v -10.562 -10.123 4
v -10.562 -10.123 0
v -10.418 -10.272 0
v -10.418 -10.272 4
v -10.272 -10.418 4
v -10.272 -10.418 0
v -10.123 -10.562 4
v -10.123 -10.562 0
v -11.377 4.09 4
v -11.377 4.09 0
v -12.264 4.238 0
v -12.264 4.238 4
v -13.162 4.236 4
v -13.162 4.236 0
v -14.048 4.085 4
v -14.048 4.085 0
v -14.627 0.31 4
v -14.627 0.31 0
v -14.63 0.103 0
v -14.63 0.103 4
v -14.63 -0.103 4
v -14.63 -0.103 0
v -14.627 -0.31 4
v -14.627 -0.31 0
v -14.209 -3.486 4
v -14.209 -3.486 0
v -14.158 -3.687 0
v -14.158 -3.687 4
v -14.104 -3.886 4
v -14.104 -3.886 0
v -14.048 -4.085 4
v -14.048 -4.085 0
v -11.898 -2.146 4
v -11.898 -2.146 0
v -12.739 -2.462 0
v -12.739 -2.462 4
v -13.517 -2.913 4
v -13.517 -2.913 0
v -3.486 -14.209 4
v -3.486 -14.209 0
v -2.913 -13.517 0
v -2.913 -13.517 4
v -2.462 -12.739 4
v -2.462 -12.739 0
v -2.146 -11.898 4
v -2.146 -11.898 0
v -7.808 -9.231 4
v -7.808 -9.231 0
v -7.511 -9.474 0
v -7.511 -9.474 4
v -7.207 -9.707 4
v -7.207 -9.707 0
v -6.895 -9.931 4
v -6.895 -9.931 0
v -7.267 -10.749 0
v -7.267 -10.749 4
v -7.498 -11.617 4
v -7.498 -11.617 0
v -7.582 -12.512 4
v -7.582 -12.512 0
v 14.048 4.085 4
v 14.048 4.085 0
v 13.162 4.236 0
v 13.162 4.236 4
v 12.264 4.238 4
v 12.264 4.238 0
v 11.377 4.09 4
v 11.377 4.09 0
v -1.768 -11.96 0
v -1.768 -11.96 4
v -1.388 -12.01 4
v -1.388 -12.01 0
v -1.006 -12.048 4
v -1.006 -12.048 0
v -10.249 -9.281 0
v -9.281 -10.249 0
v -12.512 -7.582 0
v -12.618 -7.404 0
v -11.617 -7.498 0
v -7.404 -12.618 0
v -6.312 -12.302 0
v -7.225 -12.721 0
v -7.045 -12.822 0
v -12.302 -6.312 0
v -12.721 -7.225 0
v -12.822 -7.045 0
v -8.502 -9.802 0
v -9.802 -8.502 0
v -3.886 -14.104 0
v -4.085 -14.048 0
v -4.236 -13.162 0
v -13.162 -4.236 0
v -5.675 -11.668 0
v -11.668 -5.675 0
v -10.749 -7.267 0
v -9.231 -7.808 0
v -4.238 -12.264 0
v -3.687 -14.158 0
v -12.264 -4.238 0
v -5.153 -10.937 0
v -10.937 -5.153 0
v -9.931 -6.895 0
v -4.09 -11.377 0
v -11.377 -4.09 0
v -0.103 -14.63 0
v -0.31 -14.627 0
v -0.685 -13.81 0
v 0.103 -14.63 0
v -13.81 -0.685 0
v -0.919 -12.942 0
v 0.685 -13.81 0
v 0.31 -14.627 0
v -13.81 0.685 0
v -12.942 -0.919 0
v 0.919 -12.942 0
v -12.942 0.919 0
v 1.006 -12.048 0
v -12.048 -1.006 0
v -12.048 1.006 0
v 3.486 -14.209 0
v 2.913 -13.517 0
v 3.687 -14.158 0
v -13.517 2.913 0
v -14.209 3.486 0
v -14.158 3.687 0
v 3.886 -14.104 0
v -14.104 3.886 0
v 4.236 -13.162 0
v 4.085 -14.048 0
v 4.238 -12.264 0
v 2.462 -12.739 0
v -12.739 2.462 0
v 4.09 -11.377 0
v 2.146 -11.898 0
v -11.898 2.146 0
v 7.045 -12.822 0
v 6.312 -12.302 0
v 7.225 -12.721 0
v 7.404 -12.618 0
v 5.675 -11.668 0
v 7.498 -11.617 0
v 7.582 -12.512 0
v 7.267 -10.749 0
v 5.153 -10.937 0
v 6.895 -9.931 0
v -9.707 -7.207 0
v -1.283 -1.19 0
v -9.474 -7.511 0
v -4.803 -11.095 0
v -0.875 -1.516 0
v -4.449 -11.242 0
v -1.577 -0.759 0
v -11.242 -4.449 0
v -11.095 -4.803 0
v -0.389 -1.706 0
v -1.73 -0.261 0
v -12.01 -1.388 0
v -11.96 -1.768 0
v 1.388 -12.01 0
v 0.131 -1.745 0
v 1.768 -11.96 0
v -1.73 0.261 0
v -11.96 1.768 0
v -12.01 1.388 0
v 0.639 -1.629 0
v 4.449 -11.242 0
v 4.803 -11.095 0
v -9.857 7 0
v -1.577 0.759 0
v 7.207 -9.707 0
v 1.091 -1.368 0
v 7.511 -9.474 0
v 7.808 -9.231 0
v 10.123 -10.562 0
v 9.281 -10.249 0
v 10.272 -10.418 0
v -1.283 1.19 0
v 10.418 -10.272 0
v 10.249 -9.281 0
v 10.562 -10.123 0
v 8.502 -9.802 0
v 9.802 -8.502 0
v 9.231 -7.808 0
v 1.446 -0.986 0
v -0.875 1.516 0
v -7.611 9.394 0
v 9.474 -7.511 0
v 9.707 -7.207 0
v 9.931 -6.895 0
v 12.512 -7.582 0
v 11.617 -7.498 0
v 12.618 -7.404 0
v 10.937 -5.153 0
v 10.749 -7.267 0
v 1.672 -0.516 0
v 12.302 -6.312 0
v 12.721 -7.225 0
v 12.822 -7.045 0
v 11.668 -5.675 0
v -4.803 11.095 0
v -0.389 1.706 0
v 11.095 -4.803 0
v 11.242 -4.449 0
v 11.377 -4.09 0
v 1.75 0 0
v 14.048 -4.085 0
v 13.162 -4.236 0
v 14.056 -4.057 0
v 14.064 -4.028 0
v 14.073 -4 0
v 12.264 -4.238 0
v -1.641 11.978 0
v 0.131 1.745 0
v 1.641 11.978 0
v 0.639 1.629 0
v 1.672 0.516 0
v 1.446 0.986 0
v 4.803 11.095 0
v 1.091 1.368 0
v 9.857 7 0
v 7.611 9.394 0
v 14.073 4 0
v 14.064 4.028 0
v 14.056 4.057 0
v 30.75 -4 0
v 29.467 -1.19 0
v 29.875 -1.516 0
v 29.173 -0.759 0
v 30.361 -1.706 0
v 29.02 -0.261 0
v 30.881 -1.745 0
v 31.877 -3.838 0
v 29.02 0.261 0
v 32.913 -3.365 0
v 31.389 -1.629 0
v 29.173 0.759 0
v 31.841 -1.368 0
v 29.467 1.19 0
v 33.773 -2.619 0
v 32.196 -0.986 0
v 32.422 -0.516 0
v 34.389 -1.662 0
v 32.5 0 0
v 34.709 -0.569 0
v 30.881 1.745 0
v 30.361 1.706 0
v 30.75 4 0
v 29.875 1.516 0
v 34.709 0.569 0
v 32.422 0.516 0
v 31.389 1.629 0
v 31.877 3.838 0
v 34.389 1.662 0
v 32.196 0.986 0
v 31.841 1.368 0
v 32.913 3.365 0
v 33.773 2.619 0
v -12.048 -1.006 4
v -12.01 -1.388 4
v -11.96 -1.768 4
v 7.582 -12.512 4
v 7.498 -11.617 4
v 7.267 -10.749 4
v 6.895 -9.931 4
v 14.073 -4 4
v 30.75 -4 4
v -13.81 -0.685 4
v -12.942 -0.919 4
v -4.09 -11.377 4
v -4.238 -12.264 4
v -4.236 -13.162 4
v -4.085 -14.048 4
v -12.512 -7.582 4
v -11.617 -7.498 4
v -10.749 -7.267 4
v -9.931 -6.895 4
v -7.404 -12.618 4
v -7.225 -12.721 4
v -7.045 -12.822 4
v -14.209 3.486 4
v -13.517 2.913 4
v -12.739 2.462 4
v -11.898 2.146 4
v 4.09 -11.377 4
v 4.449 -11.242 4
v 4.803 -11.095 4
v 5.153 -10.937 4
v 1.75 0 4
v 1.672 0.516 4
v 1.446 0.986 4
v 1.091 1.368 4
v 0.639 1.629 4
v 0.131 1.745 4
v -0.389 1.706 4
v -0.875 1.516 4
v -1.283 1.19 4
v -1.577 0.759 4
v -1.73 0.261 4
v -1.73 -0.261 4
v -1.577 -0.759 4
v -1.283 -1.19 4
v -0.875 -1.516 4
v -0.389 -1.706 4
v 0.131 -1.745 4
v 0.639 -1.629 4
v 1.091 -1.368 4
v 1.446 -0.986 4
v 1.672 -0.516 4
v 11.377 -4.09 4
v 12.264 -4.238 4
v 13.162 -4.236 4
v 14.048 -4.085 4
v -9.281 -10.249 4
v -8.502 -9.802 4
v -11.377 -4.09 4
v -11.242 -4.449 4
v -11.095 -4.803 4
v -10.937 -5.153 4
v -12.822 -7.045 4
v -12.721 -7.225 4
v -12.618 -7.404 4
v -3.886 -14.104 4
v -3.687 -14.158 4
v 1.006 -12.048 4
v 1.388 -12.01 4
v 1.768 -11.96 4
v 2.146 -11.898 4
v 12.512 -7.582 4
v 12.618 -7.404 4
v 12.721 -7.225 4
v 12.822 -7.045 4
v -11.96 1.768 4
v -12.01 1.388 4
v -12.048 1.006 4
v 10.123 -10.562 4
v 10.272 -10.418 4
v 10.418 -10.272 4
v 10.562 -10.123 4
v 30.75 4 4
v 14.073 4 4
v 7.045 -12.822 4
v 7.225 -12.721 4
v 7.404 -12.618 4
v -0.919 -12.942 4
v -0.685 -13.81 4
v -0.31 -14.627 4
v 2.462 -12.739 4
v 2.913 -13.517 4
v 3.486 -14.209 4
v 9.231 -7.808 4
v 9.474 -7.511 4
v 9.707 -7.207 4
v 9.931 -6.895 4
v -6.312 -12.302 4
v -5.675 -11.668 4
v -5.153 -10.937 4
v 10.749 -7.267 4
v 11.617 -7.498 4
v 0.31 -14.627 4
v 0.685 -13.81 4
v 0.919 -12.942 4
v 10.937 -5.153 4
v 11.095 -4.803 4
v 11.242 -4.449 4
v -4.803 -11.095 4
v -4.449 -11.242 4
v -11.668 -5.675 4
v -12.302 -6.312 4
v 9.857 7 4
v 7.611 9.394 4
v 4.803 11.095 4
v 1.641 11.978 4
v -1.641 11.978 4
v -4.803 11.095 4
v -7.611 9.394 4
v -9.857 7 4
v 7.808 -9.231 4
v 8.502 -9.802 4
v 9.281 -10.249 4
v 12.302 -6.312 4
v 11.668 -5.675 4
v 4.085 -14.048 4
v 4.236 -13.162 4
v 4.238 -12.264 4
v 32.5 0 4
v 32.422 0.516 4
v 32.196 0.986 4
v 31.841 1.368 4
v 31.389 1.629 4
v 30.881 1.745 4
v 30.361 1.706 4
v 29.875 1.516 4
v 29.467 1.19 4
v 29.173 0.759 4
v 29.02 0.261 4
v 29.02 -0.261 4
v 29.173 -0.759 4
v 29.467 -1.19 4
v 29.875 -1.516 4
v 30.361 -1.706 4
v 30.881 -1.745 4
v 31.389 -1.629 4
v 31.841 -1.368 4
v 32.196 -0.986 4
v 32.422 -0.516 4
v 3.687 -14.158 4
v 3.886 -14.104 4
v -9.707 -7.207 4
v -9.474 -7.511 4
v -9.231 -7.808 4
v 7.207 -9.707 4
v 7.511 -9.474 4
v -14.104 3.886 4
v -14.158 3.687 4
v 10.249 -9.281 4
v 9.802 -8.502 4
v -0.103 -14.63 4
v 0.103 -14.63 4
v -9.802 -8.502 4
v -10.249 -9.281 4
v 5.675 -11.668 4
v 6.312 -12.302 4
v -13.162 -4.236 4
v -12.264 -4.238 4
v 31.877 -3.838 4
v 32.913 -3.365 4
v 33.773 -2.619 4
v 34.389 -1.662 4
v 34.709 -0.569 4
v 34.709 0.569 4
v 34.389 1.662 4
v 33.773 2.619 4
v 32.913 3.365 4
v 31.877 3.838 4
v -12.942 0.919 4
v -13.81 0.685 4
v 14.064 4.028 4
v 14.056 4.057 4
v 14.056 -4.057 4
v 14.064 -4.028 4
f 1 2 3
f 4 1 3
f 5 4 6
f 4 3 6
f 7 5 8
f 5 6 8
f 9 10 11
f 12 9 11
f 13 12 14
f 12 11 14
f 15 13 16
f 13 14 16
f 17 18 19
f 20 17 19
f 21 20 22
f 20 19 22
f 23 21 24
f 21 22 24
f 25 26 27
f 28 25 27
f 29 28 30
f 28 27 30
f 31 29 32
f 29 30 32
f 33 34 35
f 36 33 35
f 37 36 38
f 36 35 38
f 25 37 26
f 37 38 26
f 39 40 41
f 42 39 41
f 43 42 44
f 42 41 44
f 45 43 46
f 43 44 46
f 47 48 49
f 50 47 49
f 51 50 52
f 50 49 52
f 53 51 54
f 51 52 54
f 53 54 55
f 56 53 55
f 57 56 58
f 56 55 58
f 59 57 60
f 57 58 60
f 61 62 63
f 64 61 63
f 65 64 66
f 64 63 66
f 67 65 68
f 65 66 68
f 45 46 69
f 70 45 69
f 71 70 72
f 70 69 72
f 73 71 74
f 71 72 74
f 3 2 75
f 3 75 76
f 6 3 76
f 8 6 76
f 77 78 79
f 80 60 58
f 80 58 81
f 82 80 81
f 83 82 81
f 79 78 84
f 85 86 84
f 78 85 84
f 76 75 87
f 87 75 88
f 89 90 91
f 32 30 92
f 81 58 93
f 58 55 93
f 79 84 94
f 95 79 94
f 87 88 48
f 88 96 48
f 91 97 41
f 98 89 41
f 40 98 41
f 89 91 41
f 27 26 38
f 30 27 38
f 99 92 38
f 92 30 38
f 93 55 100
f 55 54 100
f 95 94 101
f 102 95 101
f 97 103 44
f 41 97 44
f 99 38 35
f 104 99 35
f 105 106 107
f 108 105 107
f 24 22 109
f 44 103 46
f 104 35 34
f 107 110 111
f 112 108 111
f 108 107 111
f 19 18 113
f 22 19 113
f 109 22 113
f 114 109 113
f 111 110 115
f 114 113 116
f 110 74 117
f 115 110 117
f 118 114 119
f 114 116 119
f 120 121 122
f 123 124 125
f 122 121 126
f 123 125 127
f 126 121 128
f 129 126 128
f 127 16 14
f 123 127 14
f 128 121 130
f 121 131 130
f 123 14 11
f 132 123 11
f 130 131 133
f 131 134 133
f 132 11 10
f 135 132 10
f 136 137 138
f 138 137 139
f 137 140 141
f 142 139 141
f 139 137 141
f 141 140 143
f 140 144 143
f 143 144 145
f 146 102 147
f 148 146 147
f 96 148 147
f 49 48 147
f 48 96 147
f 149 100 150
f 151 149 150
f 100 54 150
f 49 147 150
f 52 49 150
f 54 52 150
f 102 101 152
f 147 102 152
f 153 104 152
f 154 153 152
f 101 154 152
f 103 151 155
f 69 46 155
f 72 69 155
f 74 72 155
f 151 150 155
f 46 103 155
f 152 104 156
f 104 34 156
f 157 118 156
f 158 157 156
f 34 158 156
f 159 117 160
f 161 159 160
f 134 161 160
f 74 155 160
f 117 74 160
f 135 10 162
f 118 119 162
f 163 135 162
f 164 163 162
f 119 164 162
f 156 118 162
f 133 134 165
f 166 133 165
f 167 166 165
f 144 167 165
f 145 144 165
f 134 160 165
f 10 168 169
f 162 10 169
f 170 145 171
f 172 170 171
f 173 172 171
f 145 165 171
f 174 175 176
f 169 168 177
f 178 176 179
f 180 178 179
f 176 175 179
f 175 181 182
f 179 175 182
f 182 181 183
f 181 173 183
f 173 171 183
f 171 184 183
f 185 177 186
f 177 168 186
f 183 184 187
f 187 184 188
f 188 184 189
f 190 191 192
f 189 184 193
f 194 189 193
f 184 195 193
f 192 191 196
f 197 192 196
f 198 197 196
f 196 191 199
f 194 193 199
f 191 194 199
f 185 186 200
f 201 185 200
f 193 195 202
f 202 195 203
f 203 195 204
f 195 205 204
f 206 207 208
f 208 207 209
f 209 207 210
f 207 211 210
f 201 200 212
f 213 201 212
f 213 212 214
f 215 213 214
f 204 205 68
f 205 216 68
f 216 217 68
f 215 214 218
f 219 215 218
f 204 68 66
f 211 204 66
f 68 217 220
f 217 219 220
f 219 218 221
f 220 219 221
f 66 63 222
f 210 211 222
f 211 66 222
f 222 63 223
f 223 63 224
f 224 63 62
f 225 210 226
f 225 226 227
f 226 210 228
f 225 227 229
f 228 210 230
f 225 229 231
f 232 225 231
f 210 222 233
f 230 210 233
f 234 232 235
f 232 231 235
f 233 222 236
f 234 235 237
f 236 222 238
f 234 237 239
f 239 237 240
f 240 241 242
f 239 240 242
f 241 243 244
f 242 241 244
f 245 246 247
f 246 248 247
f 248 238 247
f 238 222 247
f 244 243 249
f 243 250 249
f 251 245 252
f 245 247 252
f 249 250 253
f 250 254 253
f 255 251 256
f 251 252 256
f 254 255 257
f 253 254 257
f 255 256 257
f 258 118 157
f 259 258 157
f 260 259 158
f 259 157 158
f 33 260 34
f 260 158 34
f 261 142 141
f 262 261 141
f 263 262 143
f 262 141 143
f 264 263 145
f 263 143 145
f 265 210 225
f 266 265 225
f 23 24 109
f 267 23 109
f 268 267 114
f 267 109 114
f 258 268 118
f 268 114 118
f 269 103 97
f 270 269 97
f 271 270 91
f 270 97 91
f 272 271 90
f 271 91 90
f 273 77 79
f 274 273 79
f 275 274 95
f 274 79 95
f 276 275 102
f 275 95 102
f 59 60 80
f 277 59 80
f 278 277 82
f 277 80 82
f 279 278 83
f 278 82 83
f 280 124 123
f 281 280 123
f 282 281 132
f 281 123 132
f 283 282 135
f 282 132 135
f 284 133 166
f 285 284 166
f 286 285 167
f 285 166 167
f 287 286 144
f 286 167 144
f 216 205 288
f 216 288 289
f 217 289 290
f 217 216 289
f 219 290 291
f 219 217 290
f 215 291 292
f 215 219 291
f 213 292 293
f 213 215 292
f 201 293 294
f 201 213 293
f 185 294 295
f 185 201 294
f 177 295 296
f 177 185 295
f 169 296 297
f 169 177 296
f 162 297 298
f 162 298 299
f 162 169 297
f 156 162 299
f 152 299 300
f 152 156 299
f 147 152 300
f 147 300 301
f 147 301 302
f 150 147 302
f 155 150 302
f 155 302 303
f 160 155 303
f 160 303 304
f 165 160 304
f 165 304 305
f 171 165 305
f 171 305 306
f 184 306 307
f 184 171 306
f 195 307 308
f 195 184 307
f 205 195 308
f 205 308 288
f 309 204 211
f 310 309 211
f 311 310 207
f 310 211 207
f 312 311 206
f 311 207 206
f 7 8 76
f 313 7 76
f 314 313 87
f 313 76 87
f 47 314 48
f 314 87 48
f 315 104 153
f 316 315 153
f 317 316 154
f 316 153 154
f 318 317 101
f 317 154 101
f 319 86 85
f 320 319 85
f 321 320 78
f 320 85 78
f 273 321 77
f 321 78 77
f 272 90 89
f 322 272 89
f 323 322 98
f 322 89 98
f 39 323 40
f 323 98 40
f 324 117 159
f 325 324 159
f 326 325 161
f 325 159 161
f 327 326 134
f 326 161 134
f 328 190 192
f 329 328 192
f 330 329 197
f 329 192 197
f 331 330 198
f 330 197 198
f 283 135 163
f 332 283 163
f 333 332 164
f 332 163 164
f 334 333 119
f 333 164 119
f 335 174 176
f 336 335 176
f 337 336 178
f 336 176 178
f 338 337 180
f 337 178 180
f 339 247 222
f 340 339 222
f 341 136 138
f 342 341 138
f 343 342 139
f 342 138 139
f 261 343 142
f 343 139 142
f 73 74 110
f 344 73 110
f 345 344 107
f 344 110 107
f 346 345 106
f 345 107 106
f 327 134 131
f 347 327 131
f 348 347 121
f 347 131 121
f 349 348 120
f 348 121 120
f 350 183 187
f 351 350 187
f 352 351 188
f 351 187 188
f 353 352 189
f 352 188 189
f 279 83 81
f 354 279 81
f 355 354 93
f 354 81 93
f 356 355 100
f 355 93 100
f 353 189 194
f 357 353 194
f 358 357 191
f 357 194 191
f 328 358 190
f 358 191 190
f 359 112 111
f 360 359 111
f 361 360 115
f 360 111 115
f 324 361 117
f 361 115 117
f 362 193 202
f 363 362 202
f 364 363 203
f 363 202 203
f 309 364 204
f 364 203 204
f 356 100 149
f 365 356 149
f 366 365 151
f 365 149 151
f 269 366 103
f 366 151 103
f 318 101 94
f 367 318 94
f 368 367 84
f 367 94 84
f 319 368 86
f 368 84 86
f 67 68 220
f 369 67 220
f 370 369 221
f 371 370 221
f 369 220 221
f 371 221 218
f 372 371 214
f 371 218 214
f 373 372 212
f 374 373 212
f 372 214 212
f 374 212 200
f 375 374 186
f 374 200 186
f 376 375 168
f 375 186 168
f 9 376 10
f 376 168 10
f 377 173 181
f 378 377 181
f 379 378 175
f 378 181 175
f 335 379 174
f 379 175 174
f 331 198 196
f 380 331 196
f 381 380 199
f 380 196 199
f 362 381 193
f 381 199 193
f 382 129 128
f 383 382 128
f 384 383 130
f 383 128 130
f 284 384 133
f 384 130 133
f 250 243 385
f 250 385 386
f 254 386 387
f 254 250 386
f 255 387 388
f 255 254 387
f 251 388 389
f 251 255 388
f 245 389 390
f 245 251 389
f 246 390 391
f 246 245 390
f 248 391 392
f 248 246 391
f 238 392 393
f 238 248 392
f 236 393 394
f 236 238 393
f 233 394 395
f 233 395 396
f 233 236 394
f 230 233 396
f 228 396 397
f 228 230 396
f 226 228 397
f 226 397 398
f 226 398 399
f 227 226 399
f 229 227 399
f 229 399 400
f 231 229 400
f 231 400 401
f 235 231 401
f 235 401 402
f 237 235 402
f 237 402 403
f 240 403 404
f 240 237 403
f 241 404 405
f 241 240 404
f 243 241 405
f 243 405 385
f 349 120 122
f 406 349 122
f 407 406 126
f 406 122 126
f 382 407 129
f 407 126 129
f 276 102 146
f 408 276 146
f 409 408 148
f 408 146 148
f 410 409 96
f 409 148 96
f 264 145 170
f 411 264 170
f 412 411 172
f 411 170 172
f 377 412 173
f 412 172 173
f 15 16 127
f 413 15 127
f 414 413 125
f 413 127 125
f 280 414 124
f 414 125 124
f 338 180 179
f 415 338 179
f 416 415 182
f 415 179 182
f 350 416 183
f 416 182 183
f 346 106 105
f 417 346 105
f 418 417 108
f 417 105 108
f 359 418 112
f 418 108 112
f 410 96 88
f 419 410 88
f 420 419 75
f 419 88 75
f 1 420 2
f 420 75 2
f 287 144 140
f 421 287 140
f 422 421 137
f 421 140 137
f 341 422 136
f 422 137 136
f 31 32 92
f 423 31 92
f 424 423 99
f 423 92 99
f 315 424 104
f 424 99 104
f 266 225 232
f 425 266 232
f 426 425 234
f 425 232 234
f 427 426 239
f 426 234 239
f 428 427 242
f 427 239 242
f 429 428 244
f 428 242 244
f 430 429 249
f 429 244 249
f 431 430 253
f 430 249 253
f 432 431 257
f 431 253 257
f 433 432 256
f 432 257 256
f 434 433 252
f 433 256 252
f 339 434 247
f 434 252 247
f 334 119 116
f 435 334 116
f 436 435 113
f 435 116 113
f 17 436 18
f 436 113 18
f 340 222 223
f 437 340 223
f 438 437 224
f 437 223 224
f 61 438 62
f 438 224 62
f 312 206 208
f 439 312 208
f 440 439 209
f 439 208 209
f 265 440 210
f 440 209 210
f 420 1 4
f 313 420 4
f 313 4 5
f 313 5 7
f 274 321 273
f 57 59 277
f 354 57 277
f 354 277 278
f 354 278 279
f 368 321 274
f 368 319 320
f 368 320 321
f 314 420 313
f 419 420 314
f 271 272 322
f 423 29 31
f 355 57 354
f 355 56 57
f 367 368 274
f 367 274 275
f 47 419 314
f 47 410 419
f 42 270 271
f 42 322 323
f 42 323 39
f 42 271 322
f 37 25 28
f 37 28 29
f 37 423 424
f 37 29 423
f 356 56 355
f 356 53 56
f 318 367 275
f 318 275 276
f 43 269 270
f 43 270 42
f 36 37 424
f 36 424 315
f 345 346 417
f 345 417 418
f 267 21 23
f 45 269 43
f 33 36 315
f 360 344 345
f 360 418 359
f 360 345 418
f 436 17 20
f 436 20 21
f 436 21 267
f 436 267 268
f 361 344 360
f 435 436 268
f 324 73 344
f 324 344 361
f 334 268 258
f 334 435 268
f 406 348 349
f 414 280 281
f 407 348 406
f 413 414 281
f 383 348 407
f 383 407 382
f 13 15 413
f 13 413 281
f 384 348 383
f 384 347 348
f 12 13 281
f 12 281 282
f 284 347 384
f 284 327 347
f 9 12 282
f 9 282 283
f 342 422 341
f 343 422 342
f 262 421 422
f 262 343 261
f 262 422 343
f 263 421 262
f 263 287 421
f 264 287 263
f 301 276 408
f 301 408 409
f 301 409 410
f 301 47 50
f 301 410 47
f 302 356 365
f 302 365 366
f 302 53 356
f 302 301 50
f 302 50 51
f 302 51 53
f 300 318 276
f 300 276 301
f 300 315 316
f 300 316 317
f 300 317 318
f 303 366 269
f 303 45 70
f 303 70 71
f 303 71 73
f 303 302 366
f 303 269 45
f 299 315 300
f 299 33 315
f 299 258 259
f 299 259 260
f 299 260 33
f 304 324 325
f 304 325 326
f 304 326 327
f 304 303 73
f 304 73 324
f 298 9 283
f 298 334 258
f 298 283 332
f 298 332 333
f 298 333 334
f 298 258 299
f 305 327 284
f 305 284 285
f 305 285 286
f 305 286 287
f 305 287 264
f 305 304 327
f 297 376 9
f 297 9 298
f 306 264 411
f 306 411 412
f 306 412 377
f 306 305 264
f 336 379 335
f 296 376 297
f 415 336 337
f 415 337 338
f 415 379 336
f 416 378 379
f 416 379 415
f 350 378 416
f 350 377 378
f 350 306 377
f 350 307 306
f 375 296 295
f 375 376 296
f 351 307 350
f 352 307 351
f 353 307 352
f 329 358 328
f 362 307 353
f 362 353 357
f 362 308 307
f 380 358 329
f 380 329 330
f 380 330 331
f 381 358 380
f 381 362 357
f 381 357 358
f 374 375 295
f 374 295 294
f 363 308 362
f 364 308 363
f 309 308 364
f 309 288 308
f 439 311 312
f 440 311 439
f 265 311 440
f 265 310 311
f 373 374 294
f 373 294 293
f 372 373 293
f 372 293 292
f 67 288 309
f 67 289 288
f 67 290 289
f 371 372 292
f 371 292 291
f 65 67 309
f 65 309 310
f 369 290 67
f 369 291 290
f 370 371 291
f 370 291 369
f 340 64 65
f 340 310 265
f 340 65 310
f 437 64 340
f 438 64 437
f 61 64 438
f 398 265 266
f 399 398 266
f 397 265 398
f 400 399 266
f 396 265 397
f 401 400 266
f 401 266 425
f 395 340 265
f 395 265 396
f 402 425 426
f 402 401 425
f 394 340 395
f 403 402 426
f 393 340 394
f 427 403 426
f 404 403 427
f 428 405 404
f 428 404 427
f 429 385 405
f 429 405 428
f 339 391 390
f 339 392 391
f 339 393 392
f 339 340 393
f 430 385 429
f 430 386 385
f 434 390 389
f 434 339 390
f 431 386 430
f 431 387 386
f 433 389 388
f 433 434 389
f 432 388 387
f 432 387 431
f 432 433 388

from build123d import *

# Parameters (mm, degrees)
SKETCH1_R           = 1.75
BOSS_EXTRUDE1_DEPTH = 4


with BuildPart() as part:
    # Sketch1 → Boss-Extrude1 (new body)
    with BuildSketch(Plane.XY):
        with BuildLine():
            ThreePointArc((14.048088143, -4.085109489), (14.06038767, -4.04257326), (14.072558403, -4))
            Line((14.072558403, -4), (30.75, -4))
            ThreePointArc((30.75, -4), (34.75, 0), (30.75, 4))
            Line((30.75, 4), (14.072558403, 4))
            ThreePointArc((14.072558403, 4), (14.06038767, 4.04257326), (14.048088143, 4.085109489))
            ThreePointArc((14.048088143, 4.085109489), (12.712915648, 4.255390909), (11.377106712, 4.090176385))
            ThreePointArc((11.377106712, 4.090176385), (0, 12.09), (-11.377106712, 4.090176385))
            ThreePointArc((-11.377106712, 4.090176385), (-12.712915648, 4.255390909), (-14.048088143, 4.085109489))
            ThreePointArc((-14.048088143, 4.085109489), (-14.131494839, 3.78652263), (-14.208555951, 3.486235477))
            ThreePointArc((-14.208555951, 3.486235477), (-13.137403362, 2.671181194), (-11.897951627, 2.1463567))
            ThreePointArc((-11.897951627, 2.1463567), (-11.986568374, 1.578061664), (-12.048056748, 1.00619511))
            ThreePointArc((-12.048056748, 1.00619511), (-13.381109763, 0.820047291), (-14.626715284, 0.31))
            ThreePointArc((-14.626715284, 0.31), (-14.63, 0), (-14.626715284, -0.31))
            ThreePointArc((-14.626715284, -0.31), (-13.381109763, -0.820047291), (-12.048056748, -1.00619511))
            ThreePointArc((-12.048056748, -1.00619511), (-11.986568374, -1.578061664), (-11.897951627, -2.1463567))
            ThreePointArc((-11.897951627, -2.1463567), (-13.137403362, -2.671181194), (-14.208555951, -3.486235477))
            ThreePointArc((-14.208555951, -3.486235477), (-14.131494839, -3.78652263), (-14.048088143, -4.085109489))
            ThreePointArc((-14.048088143, -4.085109489), (-12.712915648, -4.255390909), (-11.377106712, -4.090176385))
            ThreePointArc((-11.377106712, -4.090176385), (-11.169703548, -4.626642697), (-10.937020765, -5.152637848))
            ThreePointArc((-10.937020765, -5.152637848), (-11.998404632, -5.980373095), (-12.82210701, -7.044889767))
            ThreePointArc((-12.82210701, -7.044889767), (-12.669951657, -7.315), (-12.51210701, -7.581825517))
            ThreePointArc((-12.51210701, -7.581825517), (-11.17835734, -7.400736668), (-9.930825655, -6.8954189))
            ThreePointArc((-9.930825655, -6.8954189), (-9.591641884, -7.359925677), (-9.230750012, -7.807775241))
            ThreePointArc((-9.230750012, -7.807775241), (-10.041734454, -8.882012453), (-10.561852666, -10.123446462))
            ThreePointArc((-10.561852666, -10.123446462), (-10.344972209, -10.344972209), (-10.123446462, -10.561852666))
            ThreePointArc((-10.123446462, -10.561852666), (-8.882012453, -10.041734454), (-7.807775241, -9.230750012))
            ThreePointArc((-7.807775241, -9.230750012), (-7.359925677, -9.591641884), (-6.8954189, -9.930825655))
            ThreePointArc((-6.8954189, -9.930825655), (-7.400736668, -11.17835734), (-7.581825517, -12.51210701))
            ThreePointArc((-7.581825517, -12.51210701), (-7.315, -12.669951657), (-7.044889767, -12.82210701))
            ThreePointArc((-7.044889767, -12.82210701), (-5.980373095, -11.998404632), (-5.152637848, -10.937020765))
            ThreePointArc((-5.152637848, -10.937020765), (-4.626642697, -11.169703548), (-4.090176385, -11.377106712))
            ThreePointArc((-4.090176385, -11.377106712), (-4.255390909, -12.712915648), (-4.085109489, -14.048088143))
            ThreePointArc((-4.085109489, -14.048088143), (-3.78652263, -14.131494839), (-3.486235477, -14.208555951))
            ThreePointArc((-3.486235477, -14.208555951), (-2.671181194, -13.137403362), (-2.1463567, -11.897951627))
            ThreePointArc((-2.1463567, -11.897951627), (-1.578061664, -11.986568374), (-1.00619511, -12.048056748))
            ThreePointArc((-1.00619511, -12.048056748), (-0.820047291, -13.381109763), (-0.31, -14.626715284))
            ThreePointArc((-0.31, -14.626715284), (0, -14.63), (0.31, -14.626715284))
            ThreePointArc((0.31, -14.626715284), (0.820047291, -13.381109763), (1.00619511, -12.048056748))
            ThreePointArc((1.00619511, -12.048056748), (1.578061664, -11.986568374), (2.1463567, -11.897951627))
            ThreePointArc((2.1463567, -11.897951627), (2.671181194, -13.137403362), (3.486235477, -14.208555951))
            ThreePointArc((3.486235477, -14.208555951), (3.78652263, -14.131494839), (4.085109489, -14.048088143))
            ThreePointArc((4.085109489, -14.048088143), (4.255390909, -12.712915648), (4.090176385, -11.377106712))
            ThreePointArc((4.090176385, -11.377106712), (4.626642697, -11.169703548), (5.152637848, -10.937020765))
            ThreePointArc((5.152637848, -10.937020765), (5.980373095, -11.998404632), (7.044889767, -12.82210701))
            ThreePointArc((7.044889767, -12.82210701), (7.315, -12.669951657), (7.581825517, -12.51210701))
            ThreePointArc((7.581825517, -12.51210701), (7.400736668, -11.17835734), (6.8954189, -9.930825655))
            ThreePointArc((6.8954189, -9.930825655), (7.359925677, -9.591641884), (7.807775241, -9.230750012))
            ThreePointArc((7.807775241, -9.230750012), (8.882012453, -10.041734454), (10.123446462, -10.561852666))
            ThreePointArc((10.123446462, -10.561852666), (10.344972209, -10.344972209), (10.561852666, -10.123446462))
            ThreePointArc((10.561852666, -10.123446462), (10.041734454, -8.882012453), (9.230750012, -7.807775241))
            ThreePointArc((9.230750012, -7.807775241), (9.591641884, -7.359925677), (9.930825655, -6.8954189))
            ThreePointArc((9.930825655, -6.8954189), (11.17835734, -7.400736668), (12.51210701, -7.581825517))
            ThreePointArc((12.51210701, -7.581825517), (12.669951657, -7.315), (12.82210701, -7.044889767))
            ThreePointArc((12.82210701, -7.044889767), (11.998404632, -5.980373095), (10.937020765, -5.152637848))
            ThreePointArc((10.937020765, -5.152637848), (11.169703548, -4.626642697), (11.377106712, -4.090176385))
            ThreePointArc((11.377106712, -4.090176385), (12.712915648, -4.255390909), (14.048088143, -4.085109489))
        make_face()
        Circle(SKETCH1_R, mode=Mode.SUBTRACT)
        with Locations((30.75, 0)):
            Circle(SKETCH1_R, mode=Mode.SUBTRACT)
    extrude(amount=BOSS_EXTRUDE1_DEPTH)


solid = part.part
